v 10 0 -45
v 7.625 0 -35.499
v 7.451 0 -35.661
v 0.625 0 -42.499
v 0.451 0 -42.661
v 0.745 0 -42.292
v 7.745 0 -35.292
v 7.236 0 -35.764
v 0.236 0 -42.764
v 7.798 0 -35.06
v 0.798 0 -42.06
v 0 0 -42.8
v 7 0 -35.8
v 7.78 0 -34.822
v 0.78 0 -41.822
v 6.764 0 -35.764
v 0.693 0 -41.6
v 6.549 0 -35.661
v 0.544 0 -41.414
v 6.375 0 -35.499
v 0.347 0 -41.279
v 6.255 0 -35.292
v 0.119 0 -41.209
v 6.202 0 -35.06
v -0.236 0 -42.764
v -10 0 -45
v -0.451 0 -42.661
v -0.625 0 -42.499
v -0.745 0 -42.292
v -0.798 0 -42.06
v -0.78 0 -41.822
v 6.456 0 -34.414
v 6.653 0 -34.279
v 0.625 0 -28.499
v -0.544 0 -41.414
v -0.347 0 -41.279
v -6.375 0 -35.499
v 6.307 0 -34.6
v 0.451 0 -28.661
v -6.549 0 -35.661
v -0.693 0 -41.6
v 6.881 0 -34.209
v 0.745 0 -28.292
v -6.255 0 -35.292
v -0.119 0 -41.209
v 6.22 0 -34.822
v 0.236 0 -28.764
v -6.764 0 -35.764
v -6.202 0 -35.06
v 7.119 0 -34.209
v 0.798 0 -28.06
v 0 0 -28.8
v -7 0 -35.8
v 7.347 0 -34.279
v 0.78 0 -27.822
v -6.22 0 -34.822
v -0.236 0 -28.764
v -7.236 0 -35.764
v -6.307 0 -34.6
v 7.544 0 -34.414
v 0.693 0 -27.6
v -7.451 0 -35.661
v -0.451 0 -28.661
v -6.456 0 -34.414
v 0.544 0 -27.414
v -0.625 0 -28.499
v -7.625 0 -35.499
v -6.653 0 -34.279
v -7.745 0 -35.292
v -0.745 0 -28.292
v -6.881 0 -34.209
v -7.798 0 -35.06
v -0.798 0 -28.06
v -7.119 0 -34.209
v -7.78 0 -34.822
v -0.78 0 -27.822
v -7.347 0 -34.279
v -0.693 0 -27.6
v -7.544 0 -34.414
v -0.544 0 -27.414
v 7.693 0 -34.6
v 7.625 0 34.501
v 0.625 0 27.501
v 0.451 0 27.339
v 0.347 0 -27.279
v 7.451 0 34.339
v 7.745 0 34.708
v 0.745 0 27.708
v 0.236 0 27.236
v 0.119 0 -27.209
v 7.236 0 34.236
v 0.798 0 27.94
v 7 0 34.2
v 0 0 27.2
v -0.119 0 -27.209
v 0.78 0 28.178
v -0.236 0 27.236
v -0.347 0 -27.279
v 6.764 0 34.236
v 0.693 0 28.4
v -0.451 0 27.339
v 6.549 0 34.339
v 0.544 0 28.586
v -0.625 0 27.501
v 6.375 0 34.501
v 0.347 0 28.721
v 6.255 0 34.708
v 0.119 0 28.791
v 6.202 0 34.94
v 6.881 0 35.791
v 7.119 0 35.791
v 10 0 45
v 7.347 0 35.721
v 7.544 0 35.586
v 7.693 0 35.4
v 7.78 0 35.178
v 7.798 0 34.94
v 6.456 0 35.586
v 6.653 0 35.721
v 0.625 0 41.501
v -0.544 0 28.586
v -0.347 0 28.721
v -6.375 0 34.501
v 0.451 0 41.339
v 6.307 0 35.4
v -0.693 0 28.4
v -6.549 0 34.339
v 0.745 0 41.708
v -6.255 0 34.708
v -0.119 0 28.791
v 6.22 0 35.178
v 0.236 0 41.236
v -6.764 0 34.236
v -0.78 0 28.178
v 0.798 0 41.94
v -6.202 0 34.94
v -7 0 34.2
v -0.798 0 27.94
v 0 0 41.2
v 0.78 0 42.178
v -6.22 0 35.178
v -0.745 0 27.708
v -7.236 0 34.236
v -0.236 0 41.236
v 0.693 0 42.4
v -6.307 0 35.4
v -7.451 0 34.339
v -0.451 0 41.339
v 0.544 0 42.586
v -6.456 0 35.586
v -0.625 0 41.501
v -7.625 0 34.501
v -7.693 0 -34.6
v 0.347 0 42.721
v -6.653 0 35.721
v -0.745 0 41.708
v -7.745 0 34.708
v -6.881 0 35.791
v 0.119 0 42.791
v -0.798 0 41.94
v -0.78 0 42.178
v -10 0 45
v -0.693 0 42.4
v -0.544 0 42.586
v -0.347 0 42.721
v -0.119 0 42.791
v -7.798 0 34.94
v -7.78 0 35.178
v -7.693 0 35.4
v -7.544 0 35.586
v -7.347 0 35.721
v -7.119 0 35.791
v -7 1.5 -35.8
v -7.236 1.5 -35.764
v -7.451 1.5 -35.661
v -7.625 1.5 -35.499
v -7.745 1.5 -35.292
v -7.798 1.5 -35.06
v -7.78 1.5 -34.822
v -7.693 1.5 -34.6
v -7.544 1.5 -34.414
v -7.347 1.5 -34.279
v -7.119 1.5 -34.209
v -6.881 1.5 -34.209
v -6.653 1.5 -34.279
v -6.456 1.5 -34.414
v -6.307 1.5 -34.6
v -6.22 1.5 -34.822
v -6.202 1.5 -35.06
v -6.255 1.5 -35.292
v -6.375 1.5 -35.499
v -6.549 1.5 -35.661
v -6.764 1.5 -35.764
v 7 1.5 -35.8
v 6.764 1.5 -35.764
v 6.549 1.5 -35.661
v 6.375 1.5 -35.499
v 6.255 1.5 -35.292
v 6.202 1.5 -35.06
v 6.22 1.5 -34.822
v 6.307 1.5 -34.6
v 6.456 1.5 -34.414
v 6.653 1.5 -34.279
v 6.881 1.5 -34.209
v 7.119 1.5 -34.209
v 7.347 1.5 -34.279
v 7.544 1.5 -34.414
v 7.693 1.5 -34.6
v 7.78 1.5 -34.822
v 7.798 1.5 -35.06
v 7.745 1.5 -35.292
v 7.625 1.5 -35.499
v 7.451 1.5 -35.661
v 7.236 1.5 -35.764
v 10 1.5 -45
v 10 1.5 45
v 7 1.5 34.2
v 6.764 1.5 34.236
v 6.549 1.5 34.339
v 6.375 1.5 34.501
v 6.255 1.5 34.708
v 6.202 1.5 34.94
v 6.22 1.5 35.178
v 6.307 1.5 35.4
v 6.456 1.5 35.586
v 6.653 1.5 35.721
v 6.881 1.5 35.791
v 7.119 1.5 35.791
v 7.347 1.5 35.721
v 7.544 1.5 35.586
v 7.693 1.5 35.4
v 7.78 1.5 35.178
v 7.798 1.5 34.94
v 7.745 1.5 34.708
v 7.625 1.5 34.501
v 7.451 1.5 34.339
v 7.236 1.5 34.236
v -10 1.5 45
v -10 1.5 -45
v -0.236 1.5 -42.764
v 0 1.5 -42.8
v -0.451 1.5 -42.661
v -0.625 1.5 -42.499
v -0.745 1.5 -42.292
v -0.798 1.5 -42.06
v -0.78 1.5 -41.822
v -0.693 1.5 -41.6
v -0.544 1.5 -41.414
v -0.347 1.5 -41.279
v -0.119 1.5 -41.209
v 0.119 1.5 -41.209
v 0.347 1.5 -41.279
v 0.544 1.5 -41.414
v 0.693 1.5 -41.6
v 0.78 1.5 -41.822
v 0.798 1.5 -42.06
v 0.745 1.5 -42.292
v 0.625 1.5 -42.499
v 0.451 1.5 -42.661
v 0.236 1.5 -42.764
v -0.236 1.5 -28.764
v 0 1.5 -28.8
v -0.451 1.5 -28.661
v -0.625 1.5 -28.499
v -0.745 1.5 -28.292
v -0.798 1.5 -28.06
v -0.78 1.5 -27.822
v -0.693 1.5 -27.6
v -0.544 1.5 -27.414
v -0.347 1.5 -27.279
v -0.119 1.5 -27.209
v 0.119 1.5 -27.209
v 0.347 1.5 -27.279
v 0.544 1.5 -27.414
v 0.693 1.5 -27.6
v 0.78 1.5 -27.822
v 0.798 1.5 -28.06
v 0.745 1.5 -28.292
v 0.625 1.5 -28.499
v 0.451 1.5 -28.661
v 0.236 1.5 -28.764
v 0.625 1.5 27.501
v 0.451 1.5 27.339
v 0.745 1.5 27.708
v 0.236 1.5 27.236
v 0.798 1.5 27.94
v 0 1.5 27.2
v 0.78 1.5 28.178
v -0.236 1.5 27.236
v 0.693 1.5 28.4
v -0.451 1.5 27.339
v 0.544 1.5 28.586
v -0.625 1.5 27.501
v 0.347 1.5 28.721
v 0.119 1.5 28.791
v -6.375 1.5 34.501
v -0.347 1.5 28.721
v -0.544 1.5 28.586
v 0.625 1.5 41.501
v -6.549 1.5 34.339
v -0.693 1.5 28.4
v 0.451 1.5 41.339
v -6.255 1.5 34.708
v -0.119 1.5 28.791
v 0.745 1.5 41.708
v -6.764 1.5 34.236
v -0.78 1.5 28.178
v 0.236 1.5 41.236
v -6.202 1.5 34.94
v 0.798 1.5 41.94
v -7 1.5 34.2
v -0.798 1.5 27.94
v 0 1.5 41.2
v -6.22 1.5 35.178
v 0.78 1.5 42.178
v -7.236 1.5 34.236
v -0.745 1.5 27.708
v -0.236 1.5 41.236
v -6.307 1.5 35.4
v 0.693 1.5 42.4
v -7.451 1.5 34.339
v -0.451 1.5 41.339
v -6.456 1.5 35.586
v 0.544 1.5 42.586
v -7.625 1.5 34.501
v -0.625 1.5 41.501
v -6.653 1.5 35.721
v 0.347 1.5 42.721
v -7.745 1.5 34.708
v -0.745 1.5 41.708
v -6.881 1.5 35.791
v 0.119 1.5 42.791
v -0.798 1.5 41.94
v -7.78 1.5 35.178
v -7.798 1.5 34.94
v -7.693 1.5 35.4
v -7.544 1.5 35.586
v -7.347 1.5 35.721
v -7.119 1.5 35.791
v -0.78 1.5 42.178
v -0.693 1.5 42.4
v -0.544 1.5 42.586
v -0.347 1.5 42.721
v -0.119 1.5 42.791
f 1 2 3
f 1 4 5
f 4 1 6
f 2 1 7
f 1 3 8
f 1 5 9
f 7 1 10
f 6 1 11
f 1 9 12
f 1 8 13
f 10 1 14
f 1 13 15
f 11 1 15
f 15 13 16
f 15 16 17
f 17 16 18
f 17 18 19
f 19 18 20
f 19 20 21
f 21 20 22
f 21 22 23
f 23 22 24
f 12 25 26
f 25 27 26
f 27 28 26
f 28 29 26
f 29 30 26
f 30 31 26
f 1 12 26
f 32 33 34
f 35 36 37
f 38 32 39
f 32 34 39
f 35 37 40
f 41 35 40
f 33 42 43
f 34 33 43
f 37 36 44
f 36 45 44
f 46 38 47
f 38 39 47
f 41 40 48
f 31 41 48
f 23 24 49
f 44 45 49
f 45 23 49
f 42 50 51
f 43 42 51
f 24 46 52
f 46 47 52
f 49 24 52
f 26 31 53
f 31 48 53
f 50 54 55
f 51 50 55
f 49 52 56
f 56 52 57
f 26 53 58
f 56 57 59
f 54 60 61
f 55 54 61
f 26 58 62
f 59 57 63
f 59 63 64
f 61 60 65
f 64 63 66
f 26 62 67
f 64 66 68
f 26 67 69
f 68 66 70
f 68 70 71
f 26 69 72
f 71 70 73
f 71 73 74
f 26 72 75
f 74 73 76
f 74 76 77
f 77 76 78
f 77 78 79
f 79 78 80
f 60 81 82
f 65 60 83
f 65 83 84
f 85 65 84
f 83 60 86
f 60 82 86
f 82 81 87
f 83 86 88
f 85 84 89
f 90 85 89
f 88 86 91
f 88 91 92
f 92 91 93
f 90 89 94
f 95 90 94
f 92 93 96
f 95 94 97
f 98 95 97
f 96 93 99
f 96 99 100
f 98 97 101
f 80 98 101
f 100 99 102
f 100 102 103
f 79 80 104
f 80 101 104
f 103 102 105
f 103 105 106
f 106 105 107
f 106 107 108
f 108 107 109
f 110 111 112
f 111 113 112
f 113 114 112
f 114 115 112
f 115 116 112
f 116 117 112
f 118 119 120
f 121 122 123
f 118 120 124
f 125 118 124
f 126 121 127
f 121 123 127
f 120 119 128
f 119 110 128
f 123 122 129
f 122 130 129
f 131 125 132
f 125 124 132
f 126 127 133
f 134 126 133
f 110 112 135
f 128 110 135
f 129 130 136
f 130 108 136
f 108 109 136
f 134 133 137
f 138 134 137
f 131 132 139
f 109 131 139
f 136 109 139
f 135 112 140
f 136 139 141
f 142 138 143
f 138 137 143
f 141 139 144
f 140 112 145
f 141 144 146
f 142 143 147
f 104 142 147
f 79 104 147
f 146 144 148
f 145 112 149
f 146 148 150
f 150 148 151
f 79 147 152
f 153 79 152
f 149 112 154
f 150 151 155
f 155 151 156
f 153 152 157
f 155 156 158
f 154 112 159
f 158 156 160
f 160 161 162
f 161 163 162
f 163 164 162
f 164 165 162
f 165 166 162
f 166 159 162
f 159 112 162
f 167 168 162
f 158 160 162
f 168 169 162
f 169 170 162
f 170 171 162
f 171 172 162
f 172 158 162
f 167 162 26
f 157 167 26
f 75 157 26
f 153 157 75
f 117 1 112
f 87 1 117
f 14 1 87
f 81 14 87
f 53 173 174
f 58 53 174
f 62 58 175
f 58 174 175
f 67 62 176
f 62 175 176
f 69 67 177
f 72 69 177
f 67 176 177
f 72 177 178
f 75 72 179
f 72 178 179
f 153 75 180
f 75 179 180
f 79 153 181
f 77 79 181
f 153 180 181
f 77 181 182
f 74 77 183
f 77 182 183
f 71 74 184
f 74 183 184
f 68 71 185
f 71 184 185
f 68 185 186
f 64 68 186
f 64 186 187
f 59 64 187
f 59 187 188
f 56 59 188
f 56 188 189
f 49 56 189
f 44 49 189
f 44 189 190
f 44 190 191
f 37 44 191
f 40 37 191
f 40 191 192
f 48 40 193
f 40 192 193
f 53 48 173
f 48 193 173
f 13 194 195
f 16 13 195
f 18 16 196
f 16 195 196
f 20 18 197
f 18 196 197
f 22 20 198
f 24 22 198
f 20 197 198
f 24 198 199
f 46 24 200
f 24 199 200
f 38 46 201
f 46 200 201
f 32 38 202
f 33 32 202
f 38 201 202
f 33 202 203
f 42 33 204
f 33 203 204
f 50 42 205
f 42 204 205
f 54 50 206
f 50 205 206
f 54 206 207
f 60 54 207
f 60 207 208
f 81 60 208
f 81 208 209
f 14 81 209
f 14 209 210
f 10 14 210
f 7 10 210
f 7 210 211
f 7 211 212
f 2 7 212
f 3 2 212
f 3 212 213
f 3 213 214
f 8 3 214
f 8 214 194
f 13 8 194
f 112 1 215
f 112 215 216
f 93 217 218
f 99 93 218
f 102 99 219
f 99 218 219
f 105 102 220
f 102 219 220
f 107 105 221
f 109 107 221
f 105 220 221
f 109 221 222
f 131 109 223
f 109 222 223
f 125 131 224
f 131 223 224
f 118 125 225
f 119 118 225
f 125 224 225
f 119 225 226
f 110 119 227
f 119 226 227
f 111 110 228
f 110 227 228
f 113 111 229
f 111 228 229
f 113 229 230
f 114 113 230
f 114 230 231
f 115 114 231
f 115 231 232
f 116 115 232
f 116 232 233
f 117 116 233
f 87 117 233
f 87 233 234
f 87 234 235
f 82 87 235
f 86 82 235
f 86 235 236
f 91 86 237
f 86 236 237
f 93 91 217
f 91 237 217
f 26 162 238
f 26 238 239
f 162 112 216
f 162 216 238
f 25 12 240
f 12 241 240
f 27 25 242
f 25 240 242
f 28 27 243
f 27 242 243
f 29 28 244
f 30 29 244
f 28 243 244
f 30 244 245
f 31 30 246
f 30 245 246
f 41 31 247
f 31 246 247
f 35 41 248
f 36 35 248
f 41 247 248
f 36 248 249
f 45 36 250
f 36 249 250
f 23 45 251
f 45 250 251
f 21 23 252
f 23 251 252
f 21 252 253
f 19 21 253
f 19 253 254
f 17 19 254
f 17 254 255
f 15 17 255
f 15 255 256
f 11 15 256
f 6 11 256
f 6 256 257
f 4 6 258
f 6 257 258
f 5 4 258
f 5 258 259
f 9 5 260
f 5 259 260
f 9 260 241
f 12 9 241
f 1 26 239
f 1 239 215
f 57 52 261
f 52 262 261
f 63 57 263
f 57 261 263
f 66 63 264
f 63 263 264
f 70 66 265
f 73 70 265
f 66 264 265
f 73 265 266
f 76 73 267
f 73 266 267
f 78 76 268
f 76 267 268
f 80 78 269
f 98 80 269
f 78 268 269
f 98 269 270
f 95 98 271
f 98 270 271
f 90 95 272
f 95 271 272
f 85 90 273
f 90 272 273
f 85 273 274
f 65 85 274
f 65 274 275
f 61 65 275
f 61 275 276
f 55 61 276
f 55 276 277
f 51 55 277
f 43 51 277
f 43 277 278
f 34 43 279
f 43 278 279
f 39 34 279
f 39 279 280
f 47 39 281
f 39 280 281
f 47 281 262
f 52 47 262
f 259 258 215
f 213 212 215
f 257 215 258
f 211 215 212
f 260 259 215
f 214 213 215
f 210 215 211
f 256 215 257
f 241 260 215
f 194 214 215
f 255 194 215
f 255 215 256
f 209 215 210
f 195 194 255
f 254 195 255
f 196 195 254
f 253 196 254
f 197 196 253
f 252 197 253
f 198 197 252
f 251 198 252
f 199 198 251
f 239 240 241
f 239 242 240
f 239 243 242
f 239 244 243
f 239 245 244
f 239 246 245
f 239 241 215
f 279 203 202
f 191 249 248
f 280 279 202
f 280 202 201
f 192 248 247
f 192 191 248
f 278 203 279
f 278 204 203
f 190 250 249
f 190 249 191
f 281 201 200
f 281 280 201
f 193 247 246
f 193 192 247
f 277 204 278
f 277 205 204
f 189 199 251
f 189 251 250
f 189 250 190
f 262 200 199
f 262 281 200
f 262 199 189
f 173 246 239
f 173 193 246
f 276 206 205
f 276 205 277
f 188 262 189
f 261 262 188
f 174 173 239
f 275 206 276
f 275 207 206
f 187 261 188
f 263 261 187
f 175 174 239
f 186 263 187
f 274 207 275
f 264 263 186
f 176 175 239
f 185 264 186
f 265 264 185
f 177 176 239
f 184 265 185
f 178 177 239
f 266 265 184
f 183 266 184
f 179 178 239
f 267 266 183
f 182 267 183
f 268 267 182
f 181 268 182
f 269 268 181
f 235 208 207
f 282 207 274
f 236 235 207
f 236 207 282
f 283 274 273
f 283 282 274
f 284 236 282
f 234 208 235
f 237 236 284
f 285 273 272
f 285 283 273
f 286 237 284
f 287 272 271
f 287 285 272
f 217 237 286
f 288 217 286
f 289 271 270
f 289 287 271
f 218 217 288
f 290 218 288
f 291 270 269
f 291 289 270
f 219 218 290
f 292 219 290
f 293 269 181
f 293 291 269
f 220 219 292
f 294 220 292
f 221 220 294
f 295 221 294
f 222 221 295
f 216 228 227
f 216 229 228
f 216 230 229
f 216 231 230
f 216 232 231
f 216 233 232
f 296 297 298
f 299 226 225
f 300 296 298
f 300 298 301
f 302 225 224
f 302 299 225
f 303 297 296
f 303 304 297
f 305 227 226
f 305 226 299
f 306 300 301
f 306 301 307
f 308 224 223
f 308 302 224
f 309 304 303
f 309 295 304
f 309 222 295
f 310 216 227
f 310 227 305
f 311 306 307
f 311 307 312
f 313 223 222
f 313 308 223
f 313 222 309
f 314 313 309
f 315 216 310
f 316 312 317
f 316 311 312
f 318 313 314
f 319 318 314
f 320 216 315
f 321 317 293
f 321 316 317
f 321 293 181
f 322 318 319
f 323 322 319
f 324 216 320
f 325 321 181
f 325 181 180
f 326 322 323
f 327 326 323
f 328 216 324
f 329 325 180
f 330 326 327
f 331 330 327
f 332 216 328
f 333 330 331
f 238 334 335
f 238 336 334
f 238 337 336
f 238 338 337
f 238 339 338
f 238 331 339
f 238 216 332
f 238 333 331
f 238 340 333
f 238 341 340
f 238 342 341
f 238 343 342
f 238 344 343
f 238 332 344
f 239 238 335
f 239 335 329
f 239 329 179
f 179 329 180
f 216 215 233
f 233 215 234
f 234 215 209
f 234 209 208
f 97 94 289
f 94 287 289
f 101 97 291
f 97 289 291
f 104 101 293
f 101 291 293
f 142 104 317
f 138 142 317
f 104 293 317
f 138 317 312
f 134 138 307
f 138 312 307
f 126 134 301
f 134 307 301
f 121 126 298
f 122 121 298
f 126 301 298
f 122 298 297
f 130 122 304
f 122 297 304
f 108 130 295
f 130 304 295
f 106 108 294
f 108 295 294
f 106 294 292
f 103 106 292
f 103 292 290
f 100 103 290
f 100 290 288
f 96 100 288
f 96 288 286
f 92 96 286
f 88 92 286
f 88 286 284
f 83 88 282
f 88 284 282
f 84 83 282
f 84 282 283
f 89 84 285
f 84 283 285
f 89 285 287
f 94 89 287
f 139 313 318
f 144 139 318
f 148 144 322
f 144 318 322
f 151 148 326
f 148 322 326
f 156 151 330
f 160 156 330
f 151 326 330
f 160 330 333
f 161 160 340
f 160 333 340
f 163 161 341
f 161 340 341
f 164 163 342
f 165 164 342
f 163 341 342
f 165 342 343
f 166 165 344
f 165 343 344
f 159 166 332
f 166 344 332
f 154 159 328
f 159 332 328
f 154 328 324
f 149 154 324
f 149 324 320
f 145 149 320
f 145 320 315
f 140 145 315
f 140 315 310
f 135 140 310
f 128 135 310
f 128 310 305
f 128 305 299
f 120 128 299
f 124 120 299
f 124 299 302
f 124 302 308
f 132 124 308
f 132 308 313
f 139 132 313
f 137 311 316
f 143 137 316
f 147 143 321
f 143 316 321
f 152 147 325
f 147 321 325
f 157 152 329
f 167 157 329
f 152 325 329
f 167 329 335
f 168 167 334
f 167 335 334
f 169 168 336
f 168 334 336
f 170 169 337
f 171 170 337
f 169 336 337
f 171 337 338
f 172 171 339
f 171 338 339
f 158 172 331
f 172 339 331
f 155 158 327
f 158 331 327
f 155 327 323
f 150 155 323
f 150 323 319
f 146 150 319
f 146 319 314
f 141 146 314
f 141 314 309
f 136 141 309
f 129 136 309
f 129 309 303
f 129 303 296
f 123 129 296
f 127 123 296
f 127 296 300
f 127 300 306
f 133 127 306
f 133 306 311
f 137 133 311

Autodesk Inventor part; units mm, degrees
ref_plane "YZ Plane" through (0, 0, 0) normal (1, 0, 0) x (0, 1, 0)
ref_plane "XZ Plane" through (0, 0, 0) normal (0, 1, 0) x (-1, 0, 0)
ref_plane "XY Plane" through (0, 0, 0) normal (0, 0, 1) x (1, 0, 0)
sketch "Sketch1" plane through (0, 0, 0) normal (0, 1, 0) x (-1, 0, 0)
  line L0 (10, -45) -> (-10, -45)
  line L1 (-10, -45) -> (-10, 45)
  line L2 (-10, 45) -> (10, 45)
  line L3 (10, 45) -> (10, -45)
  point P0 (0, 0)
  dimension "d0" = 20
  dimension "d1" = 90
  dimension "d2" = 45
  dimension "d3" = 10
extrude "Plate1" add sketch "Sketch1" along normal blind 1.5
sketch "Sketch2" plane through (0, 0, 0) normal (0, -1, 0) x (1, 0, 0)
  circle A0 centre (0, 42) radius 0.7835 projected
  circle A1 centre (-7, 35) radius 0.7835 projected
  circle A2 centre (0, 28) radius 0.7835 projected
  circle A3 centre (7, 35) radius 0.7835 projected
  circle A4 centre (0, -28) radius 0.7835 projected
  circle A5 centre (-7, -35) radius 0.7835 projected
  circle A6 centre (0, -42) radius 0.7835 projected
  circle A7 centre (7, -35) radius 0.7835 projected
  point P0 (0, 0)
hole "Hole1" at (0, 0, 42) at (-7, 0, 35) at (0, 0, 28) at (7, 0, 35) at (0, 0, -28) at (-7, 0, -35) at (0, 0, -42) at (7, 0, -35) direction (0, 1, 0) diameter 1.6 depth 1.5
equation "\"d10\" = Thickness"
equation "\"d4\" = Thickness"
equation "\"BendReliefWidth\" = Thickness"
equation "\"BendReliefDepth\" = 0.5 * Thickness"
equation "\"CornerReliefSize\" = 4 * Thickness"
equation "\"MinimumRemnant\" = 2 * Thickness"
equation "\"TransitionRadius\" = BendRadius"
equation "\"JacobiRadiusSize\" = BendRadius"
equation "\"GapSize\" = Thickness"
equation "\"Thickness\" = 1.5"
equation "\"BendRadius\" = 0.31"
properties part number "axis_10_11-connector_frame" material "Aluminum 6061-AHC"
